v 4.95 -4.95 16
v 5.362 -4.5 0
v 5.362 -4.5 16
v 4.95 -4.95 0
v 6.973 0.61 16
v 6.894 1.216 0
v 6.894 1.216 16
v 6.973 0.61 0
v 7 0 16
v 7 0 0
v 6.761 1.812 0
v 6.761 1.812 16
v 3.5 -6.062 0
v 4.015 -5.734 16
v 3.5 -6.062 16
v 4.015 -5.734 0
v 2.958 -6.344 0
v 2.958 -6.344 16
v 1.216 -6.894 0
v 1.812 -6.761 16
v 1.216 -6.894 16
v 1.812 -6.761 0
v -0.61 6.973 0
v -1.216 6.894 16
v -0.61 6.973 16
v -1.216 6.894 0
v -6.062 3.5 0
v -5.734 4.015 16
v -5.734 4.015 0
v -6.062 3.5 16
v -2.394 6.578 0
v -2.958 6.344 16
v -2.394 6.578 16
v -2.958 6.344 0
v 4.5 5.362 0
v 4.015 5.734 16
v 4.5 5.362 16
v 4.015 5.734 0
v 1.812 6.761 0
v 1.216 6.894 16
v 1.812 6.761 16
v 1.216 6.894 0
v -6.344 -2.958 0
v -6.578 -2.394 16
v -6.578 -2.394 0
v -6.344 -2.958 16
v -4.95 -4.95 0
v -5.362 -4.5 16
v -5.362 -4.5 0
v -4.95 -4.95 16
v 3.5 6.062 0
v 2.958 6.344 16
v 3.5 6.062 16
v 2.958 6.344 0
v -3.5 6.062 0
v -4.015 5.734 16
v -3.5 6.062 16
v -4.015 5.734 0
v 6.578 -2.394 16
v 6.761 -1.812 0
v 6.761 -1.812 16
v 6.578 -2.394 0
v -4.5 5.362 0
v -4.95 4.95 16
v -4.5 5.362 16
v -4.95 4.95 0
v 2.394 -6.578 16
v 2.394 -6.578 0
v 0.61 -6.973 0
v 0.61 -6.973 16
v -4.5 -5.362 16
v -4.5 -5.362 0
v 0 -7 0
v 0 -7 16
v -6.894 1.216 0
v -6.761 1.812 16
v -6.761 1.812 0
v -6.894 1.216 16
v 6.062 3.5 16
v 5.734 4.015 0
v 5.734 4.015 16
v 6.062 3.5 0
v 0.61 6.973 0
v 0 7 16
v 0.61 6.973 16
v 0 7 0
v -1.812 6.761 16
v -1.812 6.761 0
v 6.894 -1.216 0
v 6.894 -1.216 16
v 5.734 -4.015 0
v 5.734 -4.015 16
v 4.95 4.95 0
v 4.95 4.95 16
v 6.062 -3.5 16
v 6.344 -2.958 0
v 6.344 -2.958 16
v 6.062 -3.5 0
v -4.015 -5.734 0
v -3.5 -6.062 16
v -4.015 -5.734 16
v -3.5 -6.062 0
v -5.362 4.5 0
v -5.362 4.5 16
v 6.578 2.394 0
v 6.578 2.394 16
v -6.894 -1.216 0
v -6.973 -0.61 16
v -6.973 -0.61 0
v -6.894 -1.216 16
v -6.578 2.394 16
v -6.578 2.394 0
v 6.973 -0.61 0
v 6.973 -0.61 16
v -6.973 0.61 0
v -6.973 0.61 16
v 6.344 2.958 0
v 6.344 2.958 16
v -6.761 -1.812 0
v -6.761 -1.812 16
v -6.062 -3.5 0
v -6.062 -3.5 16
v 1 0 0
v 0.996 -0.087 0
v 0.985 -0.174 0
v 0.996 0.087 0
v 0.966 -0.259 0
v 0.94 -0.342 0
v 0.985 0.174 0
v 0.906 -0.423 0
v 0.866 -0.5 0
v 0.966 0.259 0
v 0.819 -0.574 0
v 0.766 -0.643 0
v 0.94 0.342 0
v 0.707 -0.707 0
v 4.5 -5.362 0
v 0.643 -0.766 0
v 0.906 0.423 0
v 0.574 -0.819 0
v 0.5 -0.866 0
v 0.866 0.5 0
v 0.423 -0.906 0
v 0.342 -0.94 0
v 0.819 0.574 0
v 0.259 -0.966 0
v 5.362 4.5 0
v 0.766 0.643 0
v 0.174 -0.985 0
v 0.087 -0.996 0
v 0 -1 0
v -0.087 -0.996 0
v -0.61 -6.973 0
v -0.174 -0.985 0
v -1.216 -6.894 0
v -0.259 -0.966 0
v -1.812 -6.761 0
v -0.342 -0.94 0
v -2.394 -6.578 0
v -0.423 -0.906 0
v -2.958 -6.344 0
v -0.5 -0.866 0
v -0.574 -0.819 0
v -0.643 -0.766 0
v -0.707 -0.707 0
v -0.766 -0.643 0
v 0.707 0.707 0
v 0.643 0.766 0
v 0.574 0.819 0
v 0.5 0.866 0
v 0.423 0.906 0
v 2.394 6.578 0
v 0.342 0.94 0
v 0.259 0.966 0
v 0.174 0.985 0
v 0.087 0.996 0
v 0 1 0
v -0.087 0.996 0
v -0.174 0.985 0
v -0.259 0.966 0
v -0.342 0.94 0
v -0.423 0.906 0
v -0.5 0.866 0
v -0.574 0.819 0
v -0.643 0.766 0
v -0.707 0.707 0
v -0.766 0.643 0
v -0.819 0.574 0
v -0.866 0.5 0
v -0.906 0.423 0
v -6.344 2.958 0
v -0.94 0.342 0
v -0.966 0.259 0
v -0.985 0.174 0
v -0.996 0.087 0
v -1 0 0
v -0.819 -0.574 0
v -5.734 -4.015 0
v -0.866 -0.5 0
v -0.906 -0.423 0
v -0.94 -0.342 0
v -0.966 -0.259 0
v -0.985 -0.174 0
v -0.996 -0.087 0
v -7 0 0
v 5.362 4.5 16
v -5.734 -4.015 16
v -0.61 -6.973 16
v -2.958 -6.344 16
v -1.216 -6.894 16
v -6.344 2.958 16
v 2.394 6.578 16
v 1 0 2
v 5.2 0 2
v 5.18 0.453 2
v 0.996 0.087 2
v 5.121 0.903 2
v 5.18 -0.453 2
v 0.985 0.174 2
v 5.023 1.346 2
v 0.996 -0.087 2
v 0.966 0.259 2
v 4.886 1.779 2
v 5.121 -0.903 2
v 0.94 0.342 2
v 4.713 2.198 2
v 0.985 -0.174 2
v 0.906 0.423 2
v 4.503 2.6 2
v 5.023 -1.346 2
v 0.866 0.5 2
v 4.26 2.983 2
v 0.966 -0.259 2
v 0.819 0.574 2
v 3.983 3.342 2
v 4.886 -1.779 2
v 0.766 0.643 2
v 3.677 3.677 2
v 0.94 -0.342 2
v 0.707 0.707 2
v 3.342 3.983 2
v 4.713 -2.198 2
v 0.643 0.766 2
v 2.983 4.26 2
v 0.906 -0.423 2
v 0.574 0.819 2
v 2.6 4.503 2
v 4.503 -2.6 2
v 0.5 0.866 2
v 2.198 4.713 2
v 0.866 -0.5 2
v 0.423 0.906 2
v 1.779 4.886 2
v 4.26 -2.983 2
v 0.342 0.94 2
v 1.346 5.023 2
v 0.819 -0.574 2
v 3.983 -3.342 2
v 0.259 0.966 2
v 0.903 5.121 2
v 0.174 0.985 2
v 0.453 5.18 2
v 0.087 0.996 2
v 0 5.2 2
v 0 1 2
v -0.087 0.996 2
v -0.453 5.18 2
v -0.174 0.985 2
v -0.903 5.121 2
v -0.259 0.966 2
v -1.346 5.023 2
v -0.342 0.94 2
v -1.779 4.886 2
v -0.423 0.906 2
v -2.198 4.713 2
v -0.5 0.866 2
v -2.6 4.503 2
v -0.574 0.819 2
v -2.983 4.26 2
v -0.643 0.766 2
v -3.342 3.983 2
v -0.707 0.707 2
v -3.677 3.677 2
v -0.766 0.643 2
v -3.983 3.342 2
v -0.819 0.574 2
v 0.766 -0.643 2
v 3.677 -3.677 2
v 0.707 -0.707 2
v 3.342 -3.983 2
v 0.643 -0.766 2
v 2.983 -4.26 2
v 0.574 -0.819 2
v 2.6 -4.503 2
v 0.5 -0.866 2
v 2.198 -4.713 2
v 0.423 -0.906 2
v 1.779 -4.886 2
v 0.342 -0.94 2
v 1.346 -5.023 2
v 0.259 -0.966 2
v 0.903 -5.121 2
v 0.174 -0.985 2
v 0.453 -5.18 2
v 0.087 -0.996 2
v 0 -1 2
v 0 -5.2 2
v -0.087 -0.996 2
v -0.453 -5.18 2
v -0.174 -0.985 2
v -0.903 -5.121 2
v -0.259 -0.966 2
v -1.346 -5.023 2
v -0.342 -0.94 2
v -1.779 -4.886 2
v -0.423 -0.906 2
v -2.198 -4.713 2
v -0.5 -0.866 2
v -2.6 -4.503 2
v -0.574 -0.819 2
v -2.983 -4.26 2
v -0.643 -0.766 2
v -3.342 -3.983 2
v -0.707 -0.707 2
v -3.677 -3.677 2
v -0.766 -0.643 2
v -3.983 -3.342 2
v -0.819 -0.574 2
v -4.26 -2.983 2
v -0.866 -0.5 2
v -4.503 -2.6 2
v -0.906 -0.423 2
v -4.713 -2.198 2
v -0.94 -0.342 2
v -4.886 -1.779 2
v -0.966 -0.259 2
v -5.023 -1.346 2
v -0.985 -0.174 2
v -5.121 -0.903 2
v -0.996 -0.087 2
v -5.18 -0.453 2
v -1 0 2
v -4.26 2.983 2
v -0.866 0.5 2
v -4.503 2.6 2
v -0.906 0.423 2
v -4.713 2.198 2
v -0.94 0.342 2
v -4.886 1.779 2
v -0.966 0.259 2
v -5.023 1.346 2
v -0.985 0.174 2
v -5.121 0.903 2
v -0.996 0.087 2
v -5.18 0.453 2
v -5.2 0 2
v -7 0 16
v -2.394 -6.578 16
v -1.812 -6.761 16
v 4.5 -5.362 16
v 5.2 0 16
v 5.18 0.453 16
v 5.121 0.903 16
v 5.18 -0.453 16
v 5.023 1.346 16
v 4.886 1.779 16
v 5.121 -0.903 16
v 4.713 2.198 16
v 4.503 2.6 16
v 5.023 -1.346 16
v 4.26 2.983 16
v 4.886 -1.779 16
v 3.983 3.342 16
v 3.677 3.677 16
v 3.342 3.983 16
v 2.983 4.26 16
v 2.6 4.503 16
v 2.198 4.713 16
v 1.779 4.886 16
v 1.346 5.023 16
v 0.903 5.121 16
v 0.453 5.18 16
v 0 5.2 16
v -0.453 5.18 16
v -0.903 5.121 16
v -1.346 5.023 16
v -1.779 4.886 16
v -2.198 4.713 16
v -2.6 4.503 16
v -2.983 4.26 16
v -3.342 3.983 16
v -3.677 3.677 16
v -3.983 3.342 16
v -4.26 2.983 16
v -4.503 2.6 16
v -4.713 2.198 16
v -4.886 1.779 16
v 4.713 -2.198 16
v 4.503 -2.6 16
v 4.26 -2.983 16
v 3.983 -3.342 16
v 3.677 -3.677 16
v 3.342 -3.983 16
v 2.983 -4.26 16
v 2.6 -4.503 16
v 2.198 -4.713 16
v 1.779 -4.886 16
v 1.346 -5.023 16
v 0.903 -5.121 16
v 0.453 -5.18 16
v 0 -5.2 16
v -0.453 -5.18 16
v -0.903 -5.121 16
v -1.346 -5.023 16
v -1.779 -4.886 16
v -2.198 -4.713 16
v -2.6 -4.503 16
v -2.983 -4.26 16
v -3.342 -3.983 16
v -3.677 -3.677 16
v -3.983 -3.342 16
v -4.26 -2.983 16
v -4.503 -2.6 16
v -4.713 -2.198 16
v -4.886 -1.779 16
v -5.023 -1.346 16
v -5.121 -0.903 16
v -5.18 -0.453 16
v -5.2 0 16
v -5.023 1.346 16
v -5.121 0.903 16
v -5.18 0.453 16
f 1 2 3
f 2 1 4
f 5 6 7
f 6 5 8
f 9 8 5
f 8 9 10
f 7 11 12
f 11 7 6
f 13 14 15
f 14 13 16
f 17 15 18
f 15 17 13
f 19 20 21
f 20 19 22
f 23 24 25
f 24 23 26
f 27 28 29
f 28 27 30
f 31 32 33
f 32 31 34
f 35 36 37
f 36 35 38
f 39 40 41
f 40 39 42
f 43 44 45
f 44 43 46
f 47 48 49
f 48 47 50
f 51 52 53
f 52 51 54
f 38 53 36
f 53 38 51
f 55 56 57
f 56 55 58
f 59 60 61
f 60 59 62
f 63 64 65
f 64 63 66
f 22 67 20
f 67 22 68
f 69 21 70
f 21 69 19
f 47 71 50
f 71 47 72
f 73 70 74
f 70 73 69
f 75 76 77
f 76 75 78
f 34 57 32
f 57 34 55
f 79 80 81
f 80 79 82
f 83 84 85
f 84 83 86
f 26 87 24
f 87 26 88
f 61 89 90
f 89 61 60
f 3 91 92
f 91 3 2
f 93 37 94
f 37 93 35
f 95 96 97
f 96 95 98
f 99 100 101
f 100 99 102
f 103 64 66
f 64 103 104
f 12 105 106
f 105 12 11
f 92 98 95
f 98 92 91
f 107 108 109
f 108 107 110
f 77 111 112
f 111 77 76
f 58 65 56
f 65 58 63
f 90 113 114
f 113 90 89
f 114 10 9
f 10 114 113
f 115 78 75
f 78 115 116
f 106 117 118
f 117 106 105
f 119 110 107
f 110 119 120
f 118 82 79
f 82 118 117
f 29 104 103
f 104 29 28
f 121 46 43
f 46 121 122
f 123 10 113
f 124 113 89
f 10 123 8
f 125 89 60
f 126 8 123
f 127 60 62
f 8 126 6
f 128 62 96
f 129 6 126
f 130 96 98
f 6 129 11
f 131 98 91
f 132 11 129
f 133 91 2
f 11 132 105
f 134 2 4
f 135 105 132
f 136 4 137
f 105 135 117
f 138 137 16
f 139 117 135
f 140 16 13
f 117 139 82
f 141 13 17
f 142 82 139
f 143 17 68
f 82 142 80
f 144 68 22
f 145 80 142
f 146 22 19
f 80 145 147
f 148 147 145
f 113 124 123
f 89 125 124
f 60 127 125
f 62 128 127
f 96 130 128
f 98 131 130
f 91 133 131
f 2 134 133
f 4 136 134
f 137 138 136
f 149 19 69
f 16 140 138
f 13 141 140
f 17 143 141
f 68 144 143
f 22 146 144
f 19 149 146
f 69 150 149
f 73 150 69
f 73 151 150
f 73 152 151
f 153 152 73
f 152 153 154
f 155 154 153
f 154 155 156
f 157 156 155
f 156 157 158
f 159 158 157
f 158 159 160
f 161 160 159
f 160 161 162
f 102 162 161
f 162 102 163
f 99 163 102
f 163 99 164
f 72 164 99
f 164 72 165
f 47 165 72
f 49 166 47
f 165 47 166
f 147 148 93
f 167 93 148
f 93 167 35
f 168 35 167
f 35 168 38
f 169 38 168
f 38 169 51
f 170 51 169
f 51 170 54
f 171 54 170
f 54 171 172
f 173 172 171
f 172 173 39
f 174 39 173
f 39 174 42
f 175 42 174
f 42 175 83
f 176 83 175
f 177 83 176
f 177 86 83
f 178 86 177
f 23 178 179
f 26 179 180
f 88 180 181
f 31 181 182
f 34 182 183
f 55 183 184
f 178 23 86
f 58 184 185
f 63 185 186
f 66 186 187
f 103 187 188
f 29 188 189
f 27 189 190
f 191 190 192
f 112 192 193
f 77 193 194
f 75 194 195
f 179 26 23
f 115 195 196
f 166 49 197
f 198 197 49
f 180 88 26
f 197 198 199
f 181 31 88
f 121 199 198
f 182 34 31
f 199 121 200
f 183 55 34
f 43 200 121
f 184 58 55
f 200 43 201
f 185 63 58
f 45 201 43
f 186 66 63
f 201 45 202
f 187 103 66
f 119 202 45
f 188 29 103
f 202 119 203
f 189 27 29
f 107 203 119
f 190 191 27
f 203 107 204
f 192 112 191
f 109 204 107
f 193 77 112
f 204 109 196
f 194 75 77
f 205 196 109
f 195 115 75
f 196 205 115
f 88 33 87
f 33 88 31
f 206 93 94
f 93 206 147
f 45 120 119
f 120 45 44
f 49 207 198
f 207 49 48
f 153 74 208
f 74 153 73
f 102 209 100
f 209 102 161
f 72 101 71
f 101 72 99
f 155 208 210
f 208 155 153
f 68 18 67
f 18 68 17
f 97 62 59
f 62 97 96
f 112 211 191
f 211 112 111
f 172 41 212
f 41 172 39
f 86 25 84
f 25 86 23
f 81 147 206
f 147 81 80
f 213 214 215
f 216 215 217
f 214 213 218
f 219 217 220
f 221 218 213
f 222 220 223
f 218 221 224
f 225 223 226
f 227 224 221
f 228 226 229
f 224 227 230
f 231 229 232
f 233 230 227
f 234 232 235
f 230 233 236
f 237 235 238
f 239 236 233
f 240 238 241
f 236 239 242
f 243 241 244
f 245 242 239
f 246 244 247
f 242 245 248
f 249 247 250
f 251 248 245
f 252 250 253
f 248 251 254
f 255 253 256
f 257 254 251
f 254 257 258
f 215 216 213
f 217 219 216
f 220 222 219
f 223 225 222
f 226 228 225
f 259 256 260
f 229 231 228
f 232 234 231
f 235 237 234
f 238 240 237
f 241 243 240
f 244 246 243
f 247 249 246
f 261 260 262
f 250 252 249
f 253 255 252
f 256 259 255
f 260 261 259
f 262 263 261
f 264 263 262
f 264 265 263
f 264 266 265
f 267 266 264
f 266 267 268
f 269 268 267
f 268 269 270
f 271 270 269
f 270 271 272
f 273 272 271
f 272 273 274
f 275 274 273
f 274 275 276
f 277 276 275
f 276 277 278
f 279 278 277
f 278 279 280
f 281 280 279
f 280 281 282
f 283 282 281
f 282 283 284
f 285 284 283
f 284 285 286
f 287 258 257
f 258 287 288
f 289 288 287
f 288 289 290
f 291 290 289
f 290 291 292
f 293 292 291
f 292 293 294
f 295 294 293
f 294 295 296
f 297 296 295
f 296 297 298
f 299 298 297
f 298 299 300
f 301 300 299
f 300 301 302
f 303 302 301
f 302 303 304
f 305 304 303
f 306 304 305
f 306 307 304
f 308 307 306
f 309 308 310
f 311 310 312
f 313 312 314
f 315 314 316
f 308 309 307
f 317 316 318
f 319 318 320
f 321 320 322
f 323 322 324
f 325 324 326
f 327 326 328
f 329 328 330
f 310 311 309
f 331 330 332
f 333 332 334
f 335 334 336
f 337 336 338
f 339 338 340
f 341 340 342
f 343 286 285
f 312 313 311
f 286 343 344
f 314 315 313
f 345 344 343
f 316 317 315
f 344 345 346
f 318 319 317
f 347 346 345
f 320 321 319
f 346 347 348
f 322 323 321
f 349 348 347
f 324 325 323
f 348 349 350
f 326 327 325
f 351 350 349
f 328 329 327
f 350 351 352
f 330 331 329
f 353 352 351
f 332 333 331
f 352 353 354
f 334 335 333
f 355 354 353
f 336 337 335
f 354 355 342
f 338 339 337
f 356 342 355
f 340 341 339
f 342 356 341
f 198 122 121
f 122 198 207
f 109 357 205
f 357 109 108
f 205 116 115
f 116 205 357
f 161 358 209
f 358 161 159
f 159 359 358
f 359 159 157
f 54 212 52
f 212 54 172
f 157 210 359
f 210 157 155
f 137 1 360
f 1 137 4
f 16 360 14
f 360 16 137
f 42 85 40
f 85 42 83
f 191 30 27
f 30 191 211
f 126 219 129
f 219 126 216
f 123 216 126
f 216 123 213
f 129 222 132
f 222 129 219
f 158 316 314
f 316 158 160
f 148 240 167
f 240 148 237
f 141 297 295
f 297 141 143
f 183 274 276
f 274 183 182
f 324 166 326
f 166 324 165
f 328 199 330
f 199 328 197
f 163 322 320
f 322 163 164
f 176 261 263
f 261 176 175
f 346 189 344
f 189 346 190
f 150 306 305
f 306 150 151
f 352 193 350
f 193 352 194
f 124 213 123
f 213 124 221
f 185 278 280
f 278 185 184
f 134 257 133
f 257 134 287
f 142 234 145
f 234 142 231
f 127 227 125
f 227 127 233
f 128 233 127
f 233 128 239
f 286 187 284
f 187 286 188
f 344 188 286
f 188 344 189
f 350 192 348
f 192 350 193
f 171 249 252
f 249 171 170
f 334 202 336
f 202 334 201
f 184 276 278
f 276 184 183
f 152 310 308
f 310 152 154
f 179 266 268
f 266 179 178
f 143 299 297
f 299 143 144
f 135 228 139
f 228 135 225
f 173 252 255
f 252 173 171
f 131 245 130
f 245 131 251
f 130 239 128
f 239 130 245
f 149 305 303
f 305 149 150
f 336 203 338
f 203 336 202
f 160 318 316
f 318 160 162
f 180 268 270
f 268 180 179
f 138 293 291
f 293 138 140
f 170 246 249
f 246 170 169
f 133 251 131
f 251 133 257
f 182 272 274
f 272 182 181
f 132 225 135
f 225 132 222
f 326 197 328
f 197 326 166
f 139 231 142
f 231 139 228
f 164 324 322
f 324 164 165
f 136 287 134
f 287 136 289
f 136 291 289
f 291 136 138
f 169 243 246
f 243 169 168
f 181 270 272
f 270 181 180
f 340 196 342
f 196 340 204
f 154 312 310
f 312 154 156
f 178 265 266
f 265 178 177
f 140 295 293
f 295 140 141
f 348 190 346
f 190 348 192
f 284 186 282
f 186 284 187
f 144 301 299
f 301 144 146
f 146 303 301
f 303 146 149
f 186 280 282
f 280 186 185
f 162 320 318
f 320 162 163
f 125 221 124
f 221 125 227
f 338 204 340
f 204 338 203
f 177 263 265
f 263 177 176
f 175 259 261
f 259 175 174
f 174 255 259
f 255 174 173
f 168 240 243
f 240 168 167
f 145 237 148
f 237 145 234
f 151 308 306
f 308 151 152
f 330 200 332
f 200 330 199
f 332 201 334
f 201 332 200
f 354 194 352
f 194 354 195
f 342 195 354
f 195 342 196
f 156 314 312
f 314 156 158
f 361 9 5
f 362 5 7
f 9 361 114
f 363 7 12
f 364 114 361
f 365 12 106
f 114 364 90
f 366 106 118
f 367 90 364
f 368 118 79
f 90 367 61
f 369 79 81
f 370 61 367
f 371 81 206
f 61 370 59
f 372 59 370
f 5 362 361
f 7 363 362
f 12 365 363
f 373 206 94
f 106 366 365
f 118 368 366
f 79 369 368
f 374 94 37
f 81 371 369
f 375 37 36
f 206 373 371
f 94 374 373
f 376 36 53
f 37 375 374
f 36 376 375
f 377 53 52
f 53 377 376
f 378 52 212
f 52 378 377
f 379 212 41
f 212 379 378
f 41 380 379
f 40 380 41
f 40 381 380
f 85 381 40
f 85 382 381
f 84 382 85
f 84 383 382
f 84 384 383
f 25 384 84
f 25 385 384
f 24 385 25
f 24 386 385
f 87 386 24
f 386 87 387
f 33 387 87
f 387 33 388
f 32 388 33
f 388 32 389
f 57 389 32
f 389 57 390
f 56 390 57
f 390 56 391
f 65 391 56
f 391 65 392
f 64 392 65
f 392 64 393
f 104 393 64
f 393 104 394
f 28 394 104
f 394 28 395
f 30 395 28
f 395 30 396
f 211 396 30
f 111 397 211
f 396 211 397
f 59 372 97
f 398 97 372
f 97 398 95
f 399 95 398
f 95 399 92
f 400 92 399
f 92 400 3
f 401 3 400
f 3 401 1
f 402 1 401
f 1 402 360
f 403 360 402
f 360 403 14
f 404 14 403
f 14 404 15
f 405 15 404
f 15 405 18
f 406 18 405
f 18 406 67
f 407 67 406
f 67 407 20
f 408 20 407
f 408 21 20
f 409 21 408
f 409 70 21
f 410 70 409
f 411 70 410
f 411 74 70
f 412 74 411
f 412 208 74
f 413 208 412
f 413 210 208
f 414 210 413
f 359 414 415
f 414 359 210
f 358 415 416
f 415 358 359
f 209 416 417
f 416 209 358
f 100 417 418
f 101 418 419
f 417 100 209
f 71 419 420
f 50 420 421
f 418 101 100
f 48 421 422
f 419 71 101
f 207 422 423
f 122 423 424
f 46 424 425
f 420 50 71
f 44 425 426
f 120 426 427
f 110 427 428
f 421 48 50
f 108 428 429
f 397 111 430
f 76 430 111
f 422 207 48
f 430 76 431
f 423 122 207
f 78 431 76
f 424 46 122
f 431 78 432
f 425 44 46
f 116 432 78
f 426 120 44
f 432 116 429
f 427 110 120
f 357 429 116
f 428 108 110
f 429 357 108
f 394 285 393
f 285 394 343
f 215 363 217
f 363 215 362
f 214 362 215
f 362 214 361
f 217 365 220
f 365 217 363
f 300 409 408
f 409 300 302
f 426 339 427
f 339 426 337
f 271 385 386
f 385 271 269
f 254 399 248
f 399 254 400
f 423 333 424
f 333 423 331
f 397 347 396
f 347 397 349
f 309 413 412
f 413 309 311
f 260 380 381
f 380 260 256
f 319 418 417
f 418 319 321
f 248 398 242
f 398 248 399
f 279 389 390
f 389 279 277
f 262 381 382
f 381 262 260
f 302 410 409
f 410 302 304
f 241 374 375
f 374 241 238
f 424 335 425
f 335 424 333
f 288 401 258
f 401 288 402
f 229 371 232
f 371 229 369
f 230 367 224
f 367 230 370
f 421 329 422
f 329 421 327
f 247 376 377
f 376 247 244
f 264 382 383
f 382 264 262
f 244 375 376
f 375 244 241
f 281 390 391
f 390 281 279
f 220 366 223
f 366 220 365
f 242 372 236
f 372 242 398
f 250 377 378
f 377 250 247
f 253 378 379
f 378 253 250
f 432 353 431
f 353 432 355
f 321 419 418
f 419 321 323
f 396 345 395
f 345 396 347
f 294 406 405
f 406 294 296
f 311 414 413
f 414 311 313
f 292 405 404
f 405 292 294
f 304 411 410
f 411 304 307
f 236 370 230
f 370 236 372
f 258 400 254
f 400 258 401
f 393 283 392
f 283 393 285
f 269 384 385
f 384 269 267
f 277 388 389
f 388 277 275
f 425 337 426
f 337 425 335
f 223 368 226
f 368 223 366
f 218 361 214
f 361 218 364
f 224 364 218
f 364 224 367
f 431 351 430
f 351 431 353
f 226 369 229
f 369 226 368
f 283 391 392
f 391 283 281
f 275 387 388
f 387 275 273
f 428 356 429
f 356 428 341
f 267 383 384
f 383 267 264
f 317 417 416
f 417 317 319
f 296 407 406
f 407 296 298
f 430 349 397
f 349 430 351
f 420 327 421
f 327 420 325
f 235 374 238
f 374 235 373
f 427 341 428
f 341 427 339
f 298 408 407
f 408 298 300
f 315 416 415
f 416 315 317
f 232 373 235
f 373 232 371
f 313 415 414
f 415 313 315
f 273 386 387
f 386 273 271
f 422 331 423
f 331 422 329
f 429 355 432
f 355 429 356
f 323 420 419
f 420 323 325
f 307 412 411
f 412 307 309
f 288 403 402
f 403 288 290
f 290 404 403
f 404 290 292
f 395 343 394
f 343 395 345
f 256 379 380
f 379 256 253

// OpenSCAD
$fn=72;
//$fs=0.1;
// +1 for smaller printing
$outer=11+3;
$inner=9+1.4;
$height=15;
$hole=2;

union(){
    translate([0,0,1])
	difference(){
		cylinder(d=$outer, h=2, center=true);
        cylinder(d=$hole, h=1e3,center=true);
	
	}
	translate([0,0,$height/2+1])		
    difference(){
		cylinder(d=$outer, h=$height, center=true);
        cylinder(d=$inner,h=1e3,center=true);
	}

}
